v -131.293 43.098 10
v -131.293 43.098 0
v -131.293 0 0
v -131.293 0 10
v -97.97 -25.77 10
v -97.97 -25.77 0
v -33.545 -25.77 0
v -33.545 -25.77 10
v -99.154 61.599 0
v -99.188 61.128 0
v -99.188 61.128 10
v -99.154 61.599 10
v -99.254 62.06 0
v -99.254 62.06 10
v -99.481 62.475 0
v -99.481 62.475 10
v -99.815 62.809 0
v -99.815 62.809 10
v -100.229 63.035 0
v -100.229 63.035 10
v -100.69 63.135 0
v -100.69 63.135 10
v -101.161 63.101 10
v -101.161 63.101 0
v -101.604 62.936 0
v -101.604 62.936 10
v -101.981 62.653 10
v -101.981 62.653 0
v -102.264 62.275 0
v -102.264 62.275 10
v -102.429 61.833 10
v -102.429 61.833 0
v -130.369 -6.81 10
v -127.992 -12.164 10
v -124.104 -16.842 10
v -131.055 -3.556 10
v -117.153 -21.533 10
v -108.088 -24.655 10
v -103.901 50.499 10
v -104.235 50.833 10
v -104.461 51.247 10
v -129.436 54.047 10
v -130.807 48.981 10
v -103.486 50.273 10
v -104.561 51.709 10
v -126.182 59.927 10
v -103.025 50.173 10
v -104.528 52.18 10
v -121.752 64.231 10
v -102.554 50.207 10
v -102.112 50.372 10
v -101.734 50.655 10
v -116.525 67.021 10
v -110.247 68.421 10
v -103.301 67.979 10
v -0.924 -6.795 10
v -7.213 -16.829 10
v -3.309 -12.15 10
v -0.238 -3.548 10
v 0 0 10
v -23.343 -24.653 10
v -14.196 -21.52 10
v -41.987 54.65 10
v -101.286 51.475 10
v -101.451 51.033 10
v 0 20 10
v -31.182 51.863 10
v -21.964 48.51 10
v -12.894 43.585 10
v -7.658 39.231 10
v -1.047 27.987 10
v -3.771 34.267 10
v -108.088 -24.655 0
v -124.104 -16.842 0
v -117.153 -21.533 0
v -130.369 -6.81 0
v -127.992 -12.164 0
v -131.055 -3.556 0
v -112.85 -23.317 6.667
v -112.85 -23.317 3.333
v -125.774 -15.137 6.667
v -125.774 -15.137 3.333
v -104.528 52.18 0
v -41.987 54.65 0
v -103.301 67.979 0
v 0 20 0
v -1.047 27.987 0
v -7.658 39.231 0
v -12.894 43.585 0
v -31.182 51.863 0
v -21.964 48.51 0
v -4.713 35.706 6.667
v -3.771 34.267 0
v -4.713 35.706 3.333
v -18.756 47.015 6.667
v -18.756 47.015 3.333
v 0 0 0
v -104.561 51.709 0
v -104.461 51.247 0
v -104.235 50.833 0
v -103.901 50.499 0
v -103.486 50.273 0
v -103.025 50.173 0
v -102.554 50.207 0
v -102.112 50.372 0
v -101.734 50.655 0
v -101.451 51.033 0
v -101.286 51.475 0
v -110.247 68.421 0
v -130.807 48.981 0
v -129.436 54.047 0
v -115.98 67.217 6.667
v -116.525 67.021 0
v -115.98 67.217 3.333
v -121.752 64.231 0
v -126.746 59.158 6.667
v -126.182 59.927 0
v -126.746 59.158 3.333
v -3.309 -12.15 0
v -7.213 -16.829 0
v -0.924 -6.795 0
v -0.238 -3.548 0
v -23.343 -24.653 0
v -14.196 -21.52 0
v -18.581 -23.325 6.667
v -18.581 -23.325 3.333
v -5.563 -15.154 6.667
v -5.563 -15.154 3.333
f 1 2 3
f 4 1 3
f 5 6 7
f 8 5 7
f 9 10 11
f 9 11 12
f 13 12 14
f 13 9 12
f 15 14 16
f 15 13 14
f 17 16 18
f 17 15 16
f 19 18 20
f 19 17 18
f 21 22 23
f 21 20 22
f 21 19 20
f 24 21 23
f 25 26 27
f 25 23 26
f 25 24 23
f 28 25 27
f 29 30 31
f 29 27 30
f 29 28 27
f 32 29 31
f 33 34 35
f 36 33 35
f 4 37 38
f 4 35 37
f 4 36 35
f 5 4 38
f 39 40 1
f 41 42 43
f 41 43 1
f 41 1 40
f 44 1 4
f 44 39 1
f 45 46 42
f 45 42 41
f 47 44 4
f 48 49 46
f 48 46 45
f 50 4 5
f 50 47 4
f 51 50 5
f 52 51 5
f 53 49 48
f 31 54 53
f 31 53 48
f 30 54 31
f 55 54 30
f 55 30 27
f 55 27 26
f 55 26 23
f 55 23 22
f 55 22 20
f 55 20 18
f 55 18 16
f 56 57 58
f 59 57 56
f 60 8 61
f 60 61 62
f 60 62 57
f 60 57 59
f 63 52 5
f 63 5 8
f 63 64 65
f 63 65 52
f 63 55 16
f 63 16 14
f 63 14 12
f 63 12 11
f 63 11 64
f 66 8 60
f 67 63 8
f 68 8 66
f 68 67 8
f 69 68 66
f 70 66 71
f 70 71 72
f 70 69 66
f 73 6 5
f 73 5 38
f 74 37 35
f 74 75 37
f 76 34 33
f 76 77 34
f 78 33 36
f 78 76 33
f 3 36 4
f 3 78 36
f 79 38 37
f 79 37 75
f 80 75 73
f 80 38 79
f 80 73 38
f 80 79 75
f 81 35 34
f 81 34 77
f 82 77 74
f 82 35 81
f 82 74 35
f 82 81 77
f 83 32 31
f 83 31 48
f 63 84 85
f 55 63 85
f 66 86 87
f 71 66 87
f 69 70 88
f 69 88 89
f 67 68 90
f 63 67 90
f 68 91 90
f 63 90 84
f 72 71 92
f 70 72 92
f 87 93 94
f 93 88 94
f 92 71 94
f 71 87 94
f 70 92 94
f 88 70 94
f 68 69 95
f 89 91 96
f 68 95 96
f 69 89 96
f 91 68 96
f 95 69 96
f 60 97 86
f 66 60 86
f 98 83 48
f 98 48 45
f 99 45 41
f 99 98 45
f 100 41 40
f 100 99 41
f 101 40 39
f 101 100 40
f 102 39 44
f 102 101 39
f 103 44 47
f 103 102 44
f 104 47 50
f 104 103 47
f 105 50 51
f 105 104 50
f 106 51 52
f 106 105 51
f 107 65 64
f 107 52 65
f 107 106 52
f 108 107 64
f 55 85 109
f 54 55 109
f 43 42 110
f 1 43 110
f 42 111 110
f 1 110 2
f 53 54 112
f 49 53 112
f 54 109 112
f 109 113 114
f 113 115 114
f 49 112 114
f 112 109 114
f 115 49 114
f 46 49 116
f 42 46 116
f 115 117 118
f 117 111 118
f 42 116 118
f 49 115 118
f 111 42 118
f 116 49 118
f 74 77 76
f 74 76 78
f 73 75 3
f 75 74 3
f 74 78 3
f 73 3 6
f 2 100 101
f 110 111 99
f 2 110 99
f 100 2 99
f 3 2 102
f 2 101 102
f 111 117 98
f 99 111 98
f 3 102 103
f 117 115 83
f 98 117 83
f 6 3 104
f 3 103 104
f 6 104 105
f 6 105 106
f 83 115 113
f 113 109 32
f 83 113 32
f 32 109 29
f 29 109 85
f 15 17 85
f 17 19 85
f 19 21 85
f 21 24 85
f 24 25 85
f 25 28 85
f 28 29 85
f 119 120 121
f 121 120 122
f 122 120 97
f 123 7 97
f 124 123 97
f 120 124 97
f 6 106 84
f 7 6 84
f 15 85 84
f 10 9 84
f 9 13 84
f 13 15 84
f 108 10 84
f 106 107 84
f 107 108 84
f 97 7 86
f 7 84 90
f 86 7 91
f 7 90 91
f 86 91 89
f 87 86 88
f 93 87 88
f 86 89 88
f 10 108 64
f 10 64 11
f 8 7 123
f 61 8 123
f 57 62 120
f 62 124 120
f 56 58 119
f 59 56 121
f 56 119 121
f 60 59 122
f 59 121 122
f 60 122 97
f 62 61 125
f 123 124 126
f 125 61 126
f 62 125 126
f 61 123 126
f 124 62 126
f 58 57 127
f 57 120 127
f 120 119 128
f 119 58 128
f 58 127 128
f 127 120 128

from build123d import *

# Parameters (mm, degrees)
EXTRUDE_1_DEPTH     = 10
CUT_EXTRUDE_1_DEPTH = 149.427210809


with BuildPart() as part:
    # Эскиз1_fr → Бобышка-Вытянуть1 (new body)
    with BuildSketch(Plane.XY):
        with BuildLine():
            Line((0, 0), (0, 20))
            add(Edge.make_bspline(
                [(0, 20), (0, 38.146025899), (-14.209474182, 48.611098897), (-41.986949672, 54.649680525)],
                knots=[0, 0, 0, 0, 1, 1, 1, 1], degree=3))
            Line((-41.986949672, 54.649680525), (-103.301225383, 67.978870897))
            add(Edge.make_bspline(
                [(-103.301225383, 67.978870897), (-115.500001367, 70.63077872), (-131.292525164, 63.393306184), (-131.292525164, 43.097715536)],
                knots=[0, 0, 0, 0, 1, 1, 1, 1], degree=3))
            Line((-131.292525164, 43.097715536), (-131.292525164, 0))
            add(Edge.make_bspline(
                [(-97.969549234, -25.769768053), (-112.011160689, -25.769768053), (-131.292525164, -19.025155818), (-131.292525164, 0)],
                knots=[0, 0, 0, 0, 1, 1, 1, 1], degree=3))
            Line((-97.969549234, -25.769768053), (-33.545129103, -25.769768053))
            add(Edge.make_bspline(
                [(-33.545129103, -25.769768053), (-19.444866568, -25.769768053), (0, -19.063757455), (0, 0)],
                knots=[0, 0, 0, 0, 1, 1, 1, 1], degree=3))
        make_face()
    extrude(amount=EXTRUDE_1_DEPTH)

    # Эскиз2_fr → Вырез-Вытянуть1 (cut, through all)
    with BuildSketch(Plane(origin=(0, 0, 0), x_dir=(-1, 0, 0), z_dir=(0, 0, -1))):
        with BuildLine():
            Line((102.429251955, 61.832882372), (104.527789693, 52.179608775))
            ThreePointArc((104.527789693, 52.179608775), (103.259303337, 50.206407776), (101.286102339, 51.474894133))
            Line((101.286102339, 51.474894133), (99.1875646, 61.128167729))
            ThreePointArc((99.1875646, 61.128167729), (100.456050956, 63.101368728), (102.429251955, 61.832882372))
        make_face()
    extrude(amount=-CUT_EXTRUDE_1_DEPTH, mode=Mode.SUBTRACT)


solid = part.part
